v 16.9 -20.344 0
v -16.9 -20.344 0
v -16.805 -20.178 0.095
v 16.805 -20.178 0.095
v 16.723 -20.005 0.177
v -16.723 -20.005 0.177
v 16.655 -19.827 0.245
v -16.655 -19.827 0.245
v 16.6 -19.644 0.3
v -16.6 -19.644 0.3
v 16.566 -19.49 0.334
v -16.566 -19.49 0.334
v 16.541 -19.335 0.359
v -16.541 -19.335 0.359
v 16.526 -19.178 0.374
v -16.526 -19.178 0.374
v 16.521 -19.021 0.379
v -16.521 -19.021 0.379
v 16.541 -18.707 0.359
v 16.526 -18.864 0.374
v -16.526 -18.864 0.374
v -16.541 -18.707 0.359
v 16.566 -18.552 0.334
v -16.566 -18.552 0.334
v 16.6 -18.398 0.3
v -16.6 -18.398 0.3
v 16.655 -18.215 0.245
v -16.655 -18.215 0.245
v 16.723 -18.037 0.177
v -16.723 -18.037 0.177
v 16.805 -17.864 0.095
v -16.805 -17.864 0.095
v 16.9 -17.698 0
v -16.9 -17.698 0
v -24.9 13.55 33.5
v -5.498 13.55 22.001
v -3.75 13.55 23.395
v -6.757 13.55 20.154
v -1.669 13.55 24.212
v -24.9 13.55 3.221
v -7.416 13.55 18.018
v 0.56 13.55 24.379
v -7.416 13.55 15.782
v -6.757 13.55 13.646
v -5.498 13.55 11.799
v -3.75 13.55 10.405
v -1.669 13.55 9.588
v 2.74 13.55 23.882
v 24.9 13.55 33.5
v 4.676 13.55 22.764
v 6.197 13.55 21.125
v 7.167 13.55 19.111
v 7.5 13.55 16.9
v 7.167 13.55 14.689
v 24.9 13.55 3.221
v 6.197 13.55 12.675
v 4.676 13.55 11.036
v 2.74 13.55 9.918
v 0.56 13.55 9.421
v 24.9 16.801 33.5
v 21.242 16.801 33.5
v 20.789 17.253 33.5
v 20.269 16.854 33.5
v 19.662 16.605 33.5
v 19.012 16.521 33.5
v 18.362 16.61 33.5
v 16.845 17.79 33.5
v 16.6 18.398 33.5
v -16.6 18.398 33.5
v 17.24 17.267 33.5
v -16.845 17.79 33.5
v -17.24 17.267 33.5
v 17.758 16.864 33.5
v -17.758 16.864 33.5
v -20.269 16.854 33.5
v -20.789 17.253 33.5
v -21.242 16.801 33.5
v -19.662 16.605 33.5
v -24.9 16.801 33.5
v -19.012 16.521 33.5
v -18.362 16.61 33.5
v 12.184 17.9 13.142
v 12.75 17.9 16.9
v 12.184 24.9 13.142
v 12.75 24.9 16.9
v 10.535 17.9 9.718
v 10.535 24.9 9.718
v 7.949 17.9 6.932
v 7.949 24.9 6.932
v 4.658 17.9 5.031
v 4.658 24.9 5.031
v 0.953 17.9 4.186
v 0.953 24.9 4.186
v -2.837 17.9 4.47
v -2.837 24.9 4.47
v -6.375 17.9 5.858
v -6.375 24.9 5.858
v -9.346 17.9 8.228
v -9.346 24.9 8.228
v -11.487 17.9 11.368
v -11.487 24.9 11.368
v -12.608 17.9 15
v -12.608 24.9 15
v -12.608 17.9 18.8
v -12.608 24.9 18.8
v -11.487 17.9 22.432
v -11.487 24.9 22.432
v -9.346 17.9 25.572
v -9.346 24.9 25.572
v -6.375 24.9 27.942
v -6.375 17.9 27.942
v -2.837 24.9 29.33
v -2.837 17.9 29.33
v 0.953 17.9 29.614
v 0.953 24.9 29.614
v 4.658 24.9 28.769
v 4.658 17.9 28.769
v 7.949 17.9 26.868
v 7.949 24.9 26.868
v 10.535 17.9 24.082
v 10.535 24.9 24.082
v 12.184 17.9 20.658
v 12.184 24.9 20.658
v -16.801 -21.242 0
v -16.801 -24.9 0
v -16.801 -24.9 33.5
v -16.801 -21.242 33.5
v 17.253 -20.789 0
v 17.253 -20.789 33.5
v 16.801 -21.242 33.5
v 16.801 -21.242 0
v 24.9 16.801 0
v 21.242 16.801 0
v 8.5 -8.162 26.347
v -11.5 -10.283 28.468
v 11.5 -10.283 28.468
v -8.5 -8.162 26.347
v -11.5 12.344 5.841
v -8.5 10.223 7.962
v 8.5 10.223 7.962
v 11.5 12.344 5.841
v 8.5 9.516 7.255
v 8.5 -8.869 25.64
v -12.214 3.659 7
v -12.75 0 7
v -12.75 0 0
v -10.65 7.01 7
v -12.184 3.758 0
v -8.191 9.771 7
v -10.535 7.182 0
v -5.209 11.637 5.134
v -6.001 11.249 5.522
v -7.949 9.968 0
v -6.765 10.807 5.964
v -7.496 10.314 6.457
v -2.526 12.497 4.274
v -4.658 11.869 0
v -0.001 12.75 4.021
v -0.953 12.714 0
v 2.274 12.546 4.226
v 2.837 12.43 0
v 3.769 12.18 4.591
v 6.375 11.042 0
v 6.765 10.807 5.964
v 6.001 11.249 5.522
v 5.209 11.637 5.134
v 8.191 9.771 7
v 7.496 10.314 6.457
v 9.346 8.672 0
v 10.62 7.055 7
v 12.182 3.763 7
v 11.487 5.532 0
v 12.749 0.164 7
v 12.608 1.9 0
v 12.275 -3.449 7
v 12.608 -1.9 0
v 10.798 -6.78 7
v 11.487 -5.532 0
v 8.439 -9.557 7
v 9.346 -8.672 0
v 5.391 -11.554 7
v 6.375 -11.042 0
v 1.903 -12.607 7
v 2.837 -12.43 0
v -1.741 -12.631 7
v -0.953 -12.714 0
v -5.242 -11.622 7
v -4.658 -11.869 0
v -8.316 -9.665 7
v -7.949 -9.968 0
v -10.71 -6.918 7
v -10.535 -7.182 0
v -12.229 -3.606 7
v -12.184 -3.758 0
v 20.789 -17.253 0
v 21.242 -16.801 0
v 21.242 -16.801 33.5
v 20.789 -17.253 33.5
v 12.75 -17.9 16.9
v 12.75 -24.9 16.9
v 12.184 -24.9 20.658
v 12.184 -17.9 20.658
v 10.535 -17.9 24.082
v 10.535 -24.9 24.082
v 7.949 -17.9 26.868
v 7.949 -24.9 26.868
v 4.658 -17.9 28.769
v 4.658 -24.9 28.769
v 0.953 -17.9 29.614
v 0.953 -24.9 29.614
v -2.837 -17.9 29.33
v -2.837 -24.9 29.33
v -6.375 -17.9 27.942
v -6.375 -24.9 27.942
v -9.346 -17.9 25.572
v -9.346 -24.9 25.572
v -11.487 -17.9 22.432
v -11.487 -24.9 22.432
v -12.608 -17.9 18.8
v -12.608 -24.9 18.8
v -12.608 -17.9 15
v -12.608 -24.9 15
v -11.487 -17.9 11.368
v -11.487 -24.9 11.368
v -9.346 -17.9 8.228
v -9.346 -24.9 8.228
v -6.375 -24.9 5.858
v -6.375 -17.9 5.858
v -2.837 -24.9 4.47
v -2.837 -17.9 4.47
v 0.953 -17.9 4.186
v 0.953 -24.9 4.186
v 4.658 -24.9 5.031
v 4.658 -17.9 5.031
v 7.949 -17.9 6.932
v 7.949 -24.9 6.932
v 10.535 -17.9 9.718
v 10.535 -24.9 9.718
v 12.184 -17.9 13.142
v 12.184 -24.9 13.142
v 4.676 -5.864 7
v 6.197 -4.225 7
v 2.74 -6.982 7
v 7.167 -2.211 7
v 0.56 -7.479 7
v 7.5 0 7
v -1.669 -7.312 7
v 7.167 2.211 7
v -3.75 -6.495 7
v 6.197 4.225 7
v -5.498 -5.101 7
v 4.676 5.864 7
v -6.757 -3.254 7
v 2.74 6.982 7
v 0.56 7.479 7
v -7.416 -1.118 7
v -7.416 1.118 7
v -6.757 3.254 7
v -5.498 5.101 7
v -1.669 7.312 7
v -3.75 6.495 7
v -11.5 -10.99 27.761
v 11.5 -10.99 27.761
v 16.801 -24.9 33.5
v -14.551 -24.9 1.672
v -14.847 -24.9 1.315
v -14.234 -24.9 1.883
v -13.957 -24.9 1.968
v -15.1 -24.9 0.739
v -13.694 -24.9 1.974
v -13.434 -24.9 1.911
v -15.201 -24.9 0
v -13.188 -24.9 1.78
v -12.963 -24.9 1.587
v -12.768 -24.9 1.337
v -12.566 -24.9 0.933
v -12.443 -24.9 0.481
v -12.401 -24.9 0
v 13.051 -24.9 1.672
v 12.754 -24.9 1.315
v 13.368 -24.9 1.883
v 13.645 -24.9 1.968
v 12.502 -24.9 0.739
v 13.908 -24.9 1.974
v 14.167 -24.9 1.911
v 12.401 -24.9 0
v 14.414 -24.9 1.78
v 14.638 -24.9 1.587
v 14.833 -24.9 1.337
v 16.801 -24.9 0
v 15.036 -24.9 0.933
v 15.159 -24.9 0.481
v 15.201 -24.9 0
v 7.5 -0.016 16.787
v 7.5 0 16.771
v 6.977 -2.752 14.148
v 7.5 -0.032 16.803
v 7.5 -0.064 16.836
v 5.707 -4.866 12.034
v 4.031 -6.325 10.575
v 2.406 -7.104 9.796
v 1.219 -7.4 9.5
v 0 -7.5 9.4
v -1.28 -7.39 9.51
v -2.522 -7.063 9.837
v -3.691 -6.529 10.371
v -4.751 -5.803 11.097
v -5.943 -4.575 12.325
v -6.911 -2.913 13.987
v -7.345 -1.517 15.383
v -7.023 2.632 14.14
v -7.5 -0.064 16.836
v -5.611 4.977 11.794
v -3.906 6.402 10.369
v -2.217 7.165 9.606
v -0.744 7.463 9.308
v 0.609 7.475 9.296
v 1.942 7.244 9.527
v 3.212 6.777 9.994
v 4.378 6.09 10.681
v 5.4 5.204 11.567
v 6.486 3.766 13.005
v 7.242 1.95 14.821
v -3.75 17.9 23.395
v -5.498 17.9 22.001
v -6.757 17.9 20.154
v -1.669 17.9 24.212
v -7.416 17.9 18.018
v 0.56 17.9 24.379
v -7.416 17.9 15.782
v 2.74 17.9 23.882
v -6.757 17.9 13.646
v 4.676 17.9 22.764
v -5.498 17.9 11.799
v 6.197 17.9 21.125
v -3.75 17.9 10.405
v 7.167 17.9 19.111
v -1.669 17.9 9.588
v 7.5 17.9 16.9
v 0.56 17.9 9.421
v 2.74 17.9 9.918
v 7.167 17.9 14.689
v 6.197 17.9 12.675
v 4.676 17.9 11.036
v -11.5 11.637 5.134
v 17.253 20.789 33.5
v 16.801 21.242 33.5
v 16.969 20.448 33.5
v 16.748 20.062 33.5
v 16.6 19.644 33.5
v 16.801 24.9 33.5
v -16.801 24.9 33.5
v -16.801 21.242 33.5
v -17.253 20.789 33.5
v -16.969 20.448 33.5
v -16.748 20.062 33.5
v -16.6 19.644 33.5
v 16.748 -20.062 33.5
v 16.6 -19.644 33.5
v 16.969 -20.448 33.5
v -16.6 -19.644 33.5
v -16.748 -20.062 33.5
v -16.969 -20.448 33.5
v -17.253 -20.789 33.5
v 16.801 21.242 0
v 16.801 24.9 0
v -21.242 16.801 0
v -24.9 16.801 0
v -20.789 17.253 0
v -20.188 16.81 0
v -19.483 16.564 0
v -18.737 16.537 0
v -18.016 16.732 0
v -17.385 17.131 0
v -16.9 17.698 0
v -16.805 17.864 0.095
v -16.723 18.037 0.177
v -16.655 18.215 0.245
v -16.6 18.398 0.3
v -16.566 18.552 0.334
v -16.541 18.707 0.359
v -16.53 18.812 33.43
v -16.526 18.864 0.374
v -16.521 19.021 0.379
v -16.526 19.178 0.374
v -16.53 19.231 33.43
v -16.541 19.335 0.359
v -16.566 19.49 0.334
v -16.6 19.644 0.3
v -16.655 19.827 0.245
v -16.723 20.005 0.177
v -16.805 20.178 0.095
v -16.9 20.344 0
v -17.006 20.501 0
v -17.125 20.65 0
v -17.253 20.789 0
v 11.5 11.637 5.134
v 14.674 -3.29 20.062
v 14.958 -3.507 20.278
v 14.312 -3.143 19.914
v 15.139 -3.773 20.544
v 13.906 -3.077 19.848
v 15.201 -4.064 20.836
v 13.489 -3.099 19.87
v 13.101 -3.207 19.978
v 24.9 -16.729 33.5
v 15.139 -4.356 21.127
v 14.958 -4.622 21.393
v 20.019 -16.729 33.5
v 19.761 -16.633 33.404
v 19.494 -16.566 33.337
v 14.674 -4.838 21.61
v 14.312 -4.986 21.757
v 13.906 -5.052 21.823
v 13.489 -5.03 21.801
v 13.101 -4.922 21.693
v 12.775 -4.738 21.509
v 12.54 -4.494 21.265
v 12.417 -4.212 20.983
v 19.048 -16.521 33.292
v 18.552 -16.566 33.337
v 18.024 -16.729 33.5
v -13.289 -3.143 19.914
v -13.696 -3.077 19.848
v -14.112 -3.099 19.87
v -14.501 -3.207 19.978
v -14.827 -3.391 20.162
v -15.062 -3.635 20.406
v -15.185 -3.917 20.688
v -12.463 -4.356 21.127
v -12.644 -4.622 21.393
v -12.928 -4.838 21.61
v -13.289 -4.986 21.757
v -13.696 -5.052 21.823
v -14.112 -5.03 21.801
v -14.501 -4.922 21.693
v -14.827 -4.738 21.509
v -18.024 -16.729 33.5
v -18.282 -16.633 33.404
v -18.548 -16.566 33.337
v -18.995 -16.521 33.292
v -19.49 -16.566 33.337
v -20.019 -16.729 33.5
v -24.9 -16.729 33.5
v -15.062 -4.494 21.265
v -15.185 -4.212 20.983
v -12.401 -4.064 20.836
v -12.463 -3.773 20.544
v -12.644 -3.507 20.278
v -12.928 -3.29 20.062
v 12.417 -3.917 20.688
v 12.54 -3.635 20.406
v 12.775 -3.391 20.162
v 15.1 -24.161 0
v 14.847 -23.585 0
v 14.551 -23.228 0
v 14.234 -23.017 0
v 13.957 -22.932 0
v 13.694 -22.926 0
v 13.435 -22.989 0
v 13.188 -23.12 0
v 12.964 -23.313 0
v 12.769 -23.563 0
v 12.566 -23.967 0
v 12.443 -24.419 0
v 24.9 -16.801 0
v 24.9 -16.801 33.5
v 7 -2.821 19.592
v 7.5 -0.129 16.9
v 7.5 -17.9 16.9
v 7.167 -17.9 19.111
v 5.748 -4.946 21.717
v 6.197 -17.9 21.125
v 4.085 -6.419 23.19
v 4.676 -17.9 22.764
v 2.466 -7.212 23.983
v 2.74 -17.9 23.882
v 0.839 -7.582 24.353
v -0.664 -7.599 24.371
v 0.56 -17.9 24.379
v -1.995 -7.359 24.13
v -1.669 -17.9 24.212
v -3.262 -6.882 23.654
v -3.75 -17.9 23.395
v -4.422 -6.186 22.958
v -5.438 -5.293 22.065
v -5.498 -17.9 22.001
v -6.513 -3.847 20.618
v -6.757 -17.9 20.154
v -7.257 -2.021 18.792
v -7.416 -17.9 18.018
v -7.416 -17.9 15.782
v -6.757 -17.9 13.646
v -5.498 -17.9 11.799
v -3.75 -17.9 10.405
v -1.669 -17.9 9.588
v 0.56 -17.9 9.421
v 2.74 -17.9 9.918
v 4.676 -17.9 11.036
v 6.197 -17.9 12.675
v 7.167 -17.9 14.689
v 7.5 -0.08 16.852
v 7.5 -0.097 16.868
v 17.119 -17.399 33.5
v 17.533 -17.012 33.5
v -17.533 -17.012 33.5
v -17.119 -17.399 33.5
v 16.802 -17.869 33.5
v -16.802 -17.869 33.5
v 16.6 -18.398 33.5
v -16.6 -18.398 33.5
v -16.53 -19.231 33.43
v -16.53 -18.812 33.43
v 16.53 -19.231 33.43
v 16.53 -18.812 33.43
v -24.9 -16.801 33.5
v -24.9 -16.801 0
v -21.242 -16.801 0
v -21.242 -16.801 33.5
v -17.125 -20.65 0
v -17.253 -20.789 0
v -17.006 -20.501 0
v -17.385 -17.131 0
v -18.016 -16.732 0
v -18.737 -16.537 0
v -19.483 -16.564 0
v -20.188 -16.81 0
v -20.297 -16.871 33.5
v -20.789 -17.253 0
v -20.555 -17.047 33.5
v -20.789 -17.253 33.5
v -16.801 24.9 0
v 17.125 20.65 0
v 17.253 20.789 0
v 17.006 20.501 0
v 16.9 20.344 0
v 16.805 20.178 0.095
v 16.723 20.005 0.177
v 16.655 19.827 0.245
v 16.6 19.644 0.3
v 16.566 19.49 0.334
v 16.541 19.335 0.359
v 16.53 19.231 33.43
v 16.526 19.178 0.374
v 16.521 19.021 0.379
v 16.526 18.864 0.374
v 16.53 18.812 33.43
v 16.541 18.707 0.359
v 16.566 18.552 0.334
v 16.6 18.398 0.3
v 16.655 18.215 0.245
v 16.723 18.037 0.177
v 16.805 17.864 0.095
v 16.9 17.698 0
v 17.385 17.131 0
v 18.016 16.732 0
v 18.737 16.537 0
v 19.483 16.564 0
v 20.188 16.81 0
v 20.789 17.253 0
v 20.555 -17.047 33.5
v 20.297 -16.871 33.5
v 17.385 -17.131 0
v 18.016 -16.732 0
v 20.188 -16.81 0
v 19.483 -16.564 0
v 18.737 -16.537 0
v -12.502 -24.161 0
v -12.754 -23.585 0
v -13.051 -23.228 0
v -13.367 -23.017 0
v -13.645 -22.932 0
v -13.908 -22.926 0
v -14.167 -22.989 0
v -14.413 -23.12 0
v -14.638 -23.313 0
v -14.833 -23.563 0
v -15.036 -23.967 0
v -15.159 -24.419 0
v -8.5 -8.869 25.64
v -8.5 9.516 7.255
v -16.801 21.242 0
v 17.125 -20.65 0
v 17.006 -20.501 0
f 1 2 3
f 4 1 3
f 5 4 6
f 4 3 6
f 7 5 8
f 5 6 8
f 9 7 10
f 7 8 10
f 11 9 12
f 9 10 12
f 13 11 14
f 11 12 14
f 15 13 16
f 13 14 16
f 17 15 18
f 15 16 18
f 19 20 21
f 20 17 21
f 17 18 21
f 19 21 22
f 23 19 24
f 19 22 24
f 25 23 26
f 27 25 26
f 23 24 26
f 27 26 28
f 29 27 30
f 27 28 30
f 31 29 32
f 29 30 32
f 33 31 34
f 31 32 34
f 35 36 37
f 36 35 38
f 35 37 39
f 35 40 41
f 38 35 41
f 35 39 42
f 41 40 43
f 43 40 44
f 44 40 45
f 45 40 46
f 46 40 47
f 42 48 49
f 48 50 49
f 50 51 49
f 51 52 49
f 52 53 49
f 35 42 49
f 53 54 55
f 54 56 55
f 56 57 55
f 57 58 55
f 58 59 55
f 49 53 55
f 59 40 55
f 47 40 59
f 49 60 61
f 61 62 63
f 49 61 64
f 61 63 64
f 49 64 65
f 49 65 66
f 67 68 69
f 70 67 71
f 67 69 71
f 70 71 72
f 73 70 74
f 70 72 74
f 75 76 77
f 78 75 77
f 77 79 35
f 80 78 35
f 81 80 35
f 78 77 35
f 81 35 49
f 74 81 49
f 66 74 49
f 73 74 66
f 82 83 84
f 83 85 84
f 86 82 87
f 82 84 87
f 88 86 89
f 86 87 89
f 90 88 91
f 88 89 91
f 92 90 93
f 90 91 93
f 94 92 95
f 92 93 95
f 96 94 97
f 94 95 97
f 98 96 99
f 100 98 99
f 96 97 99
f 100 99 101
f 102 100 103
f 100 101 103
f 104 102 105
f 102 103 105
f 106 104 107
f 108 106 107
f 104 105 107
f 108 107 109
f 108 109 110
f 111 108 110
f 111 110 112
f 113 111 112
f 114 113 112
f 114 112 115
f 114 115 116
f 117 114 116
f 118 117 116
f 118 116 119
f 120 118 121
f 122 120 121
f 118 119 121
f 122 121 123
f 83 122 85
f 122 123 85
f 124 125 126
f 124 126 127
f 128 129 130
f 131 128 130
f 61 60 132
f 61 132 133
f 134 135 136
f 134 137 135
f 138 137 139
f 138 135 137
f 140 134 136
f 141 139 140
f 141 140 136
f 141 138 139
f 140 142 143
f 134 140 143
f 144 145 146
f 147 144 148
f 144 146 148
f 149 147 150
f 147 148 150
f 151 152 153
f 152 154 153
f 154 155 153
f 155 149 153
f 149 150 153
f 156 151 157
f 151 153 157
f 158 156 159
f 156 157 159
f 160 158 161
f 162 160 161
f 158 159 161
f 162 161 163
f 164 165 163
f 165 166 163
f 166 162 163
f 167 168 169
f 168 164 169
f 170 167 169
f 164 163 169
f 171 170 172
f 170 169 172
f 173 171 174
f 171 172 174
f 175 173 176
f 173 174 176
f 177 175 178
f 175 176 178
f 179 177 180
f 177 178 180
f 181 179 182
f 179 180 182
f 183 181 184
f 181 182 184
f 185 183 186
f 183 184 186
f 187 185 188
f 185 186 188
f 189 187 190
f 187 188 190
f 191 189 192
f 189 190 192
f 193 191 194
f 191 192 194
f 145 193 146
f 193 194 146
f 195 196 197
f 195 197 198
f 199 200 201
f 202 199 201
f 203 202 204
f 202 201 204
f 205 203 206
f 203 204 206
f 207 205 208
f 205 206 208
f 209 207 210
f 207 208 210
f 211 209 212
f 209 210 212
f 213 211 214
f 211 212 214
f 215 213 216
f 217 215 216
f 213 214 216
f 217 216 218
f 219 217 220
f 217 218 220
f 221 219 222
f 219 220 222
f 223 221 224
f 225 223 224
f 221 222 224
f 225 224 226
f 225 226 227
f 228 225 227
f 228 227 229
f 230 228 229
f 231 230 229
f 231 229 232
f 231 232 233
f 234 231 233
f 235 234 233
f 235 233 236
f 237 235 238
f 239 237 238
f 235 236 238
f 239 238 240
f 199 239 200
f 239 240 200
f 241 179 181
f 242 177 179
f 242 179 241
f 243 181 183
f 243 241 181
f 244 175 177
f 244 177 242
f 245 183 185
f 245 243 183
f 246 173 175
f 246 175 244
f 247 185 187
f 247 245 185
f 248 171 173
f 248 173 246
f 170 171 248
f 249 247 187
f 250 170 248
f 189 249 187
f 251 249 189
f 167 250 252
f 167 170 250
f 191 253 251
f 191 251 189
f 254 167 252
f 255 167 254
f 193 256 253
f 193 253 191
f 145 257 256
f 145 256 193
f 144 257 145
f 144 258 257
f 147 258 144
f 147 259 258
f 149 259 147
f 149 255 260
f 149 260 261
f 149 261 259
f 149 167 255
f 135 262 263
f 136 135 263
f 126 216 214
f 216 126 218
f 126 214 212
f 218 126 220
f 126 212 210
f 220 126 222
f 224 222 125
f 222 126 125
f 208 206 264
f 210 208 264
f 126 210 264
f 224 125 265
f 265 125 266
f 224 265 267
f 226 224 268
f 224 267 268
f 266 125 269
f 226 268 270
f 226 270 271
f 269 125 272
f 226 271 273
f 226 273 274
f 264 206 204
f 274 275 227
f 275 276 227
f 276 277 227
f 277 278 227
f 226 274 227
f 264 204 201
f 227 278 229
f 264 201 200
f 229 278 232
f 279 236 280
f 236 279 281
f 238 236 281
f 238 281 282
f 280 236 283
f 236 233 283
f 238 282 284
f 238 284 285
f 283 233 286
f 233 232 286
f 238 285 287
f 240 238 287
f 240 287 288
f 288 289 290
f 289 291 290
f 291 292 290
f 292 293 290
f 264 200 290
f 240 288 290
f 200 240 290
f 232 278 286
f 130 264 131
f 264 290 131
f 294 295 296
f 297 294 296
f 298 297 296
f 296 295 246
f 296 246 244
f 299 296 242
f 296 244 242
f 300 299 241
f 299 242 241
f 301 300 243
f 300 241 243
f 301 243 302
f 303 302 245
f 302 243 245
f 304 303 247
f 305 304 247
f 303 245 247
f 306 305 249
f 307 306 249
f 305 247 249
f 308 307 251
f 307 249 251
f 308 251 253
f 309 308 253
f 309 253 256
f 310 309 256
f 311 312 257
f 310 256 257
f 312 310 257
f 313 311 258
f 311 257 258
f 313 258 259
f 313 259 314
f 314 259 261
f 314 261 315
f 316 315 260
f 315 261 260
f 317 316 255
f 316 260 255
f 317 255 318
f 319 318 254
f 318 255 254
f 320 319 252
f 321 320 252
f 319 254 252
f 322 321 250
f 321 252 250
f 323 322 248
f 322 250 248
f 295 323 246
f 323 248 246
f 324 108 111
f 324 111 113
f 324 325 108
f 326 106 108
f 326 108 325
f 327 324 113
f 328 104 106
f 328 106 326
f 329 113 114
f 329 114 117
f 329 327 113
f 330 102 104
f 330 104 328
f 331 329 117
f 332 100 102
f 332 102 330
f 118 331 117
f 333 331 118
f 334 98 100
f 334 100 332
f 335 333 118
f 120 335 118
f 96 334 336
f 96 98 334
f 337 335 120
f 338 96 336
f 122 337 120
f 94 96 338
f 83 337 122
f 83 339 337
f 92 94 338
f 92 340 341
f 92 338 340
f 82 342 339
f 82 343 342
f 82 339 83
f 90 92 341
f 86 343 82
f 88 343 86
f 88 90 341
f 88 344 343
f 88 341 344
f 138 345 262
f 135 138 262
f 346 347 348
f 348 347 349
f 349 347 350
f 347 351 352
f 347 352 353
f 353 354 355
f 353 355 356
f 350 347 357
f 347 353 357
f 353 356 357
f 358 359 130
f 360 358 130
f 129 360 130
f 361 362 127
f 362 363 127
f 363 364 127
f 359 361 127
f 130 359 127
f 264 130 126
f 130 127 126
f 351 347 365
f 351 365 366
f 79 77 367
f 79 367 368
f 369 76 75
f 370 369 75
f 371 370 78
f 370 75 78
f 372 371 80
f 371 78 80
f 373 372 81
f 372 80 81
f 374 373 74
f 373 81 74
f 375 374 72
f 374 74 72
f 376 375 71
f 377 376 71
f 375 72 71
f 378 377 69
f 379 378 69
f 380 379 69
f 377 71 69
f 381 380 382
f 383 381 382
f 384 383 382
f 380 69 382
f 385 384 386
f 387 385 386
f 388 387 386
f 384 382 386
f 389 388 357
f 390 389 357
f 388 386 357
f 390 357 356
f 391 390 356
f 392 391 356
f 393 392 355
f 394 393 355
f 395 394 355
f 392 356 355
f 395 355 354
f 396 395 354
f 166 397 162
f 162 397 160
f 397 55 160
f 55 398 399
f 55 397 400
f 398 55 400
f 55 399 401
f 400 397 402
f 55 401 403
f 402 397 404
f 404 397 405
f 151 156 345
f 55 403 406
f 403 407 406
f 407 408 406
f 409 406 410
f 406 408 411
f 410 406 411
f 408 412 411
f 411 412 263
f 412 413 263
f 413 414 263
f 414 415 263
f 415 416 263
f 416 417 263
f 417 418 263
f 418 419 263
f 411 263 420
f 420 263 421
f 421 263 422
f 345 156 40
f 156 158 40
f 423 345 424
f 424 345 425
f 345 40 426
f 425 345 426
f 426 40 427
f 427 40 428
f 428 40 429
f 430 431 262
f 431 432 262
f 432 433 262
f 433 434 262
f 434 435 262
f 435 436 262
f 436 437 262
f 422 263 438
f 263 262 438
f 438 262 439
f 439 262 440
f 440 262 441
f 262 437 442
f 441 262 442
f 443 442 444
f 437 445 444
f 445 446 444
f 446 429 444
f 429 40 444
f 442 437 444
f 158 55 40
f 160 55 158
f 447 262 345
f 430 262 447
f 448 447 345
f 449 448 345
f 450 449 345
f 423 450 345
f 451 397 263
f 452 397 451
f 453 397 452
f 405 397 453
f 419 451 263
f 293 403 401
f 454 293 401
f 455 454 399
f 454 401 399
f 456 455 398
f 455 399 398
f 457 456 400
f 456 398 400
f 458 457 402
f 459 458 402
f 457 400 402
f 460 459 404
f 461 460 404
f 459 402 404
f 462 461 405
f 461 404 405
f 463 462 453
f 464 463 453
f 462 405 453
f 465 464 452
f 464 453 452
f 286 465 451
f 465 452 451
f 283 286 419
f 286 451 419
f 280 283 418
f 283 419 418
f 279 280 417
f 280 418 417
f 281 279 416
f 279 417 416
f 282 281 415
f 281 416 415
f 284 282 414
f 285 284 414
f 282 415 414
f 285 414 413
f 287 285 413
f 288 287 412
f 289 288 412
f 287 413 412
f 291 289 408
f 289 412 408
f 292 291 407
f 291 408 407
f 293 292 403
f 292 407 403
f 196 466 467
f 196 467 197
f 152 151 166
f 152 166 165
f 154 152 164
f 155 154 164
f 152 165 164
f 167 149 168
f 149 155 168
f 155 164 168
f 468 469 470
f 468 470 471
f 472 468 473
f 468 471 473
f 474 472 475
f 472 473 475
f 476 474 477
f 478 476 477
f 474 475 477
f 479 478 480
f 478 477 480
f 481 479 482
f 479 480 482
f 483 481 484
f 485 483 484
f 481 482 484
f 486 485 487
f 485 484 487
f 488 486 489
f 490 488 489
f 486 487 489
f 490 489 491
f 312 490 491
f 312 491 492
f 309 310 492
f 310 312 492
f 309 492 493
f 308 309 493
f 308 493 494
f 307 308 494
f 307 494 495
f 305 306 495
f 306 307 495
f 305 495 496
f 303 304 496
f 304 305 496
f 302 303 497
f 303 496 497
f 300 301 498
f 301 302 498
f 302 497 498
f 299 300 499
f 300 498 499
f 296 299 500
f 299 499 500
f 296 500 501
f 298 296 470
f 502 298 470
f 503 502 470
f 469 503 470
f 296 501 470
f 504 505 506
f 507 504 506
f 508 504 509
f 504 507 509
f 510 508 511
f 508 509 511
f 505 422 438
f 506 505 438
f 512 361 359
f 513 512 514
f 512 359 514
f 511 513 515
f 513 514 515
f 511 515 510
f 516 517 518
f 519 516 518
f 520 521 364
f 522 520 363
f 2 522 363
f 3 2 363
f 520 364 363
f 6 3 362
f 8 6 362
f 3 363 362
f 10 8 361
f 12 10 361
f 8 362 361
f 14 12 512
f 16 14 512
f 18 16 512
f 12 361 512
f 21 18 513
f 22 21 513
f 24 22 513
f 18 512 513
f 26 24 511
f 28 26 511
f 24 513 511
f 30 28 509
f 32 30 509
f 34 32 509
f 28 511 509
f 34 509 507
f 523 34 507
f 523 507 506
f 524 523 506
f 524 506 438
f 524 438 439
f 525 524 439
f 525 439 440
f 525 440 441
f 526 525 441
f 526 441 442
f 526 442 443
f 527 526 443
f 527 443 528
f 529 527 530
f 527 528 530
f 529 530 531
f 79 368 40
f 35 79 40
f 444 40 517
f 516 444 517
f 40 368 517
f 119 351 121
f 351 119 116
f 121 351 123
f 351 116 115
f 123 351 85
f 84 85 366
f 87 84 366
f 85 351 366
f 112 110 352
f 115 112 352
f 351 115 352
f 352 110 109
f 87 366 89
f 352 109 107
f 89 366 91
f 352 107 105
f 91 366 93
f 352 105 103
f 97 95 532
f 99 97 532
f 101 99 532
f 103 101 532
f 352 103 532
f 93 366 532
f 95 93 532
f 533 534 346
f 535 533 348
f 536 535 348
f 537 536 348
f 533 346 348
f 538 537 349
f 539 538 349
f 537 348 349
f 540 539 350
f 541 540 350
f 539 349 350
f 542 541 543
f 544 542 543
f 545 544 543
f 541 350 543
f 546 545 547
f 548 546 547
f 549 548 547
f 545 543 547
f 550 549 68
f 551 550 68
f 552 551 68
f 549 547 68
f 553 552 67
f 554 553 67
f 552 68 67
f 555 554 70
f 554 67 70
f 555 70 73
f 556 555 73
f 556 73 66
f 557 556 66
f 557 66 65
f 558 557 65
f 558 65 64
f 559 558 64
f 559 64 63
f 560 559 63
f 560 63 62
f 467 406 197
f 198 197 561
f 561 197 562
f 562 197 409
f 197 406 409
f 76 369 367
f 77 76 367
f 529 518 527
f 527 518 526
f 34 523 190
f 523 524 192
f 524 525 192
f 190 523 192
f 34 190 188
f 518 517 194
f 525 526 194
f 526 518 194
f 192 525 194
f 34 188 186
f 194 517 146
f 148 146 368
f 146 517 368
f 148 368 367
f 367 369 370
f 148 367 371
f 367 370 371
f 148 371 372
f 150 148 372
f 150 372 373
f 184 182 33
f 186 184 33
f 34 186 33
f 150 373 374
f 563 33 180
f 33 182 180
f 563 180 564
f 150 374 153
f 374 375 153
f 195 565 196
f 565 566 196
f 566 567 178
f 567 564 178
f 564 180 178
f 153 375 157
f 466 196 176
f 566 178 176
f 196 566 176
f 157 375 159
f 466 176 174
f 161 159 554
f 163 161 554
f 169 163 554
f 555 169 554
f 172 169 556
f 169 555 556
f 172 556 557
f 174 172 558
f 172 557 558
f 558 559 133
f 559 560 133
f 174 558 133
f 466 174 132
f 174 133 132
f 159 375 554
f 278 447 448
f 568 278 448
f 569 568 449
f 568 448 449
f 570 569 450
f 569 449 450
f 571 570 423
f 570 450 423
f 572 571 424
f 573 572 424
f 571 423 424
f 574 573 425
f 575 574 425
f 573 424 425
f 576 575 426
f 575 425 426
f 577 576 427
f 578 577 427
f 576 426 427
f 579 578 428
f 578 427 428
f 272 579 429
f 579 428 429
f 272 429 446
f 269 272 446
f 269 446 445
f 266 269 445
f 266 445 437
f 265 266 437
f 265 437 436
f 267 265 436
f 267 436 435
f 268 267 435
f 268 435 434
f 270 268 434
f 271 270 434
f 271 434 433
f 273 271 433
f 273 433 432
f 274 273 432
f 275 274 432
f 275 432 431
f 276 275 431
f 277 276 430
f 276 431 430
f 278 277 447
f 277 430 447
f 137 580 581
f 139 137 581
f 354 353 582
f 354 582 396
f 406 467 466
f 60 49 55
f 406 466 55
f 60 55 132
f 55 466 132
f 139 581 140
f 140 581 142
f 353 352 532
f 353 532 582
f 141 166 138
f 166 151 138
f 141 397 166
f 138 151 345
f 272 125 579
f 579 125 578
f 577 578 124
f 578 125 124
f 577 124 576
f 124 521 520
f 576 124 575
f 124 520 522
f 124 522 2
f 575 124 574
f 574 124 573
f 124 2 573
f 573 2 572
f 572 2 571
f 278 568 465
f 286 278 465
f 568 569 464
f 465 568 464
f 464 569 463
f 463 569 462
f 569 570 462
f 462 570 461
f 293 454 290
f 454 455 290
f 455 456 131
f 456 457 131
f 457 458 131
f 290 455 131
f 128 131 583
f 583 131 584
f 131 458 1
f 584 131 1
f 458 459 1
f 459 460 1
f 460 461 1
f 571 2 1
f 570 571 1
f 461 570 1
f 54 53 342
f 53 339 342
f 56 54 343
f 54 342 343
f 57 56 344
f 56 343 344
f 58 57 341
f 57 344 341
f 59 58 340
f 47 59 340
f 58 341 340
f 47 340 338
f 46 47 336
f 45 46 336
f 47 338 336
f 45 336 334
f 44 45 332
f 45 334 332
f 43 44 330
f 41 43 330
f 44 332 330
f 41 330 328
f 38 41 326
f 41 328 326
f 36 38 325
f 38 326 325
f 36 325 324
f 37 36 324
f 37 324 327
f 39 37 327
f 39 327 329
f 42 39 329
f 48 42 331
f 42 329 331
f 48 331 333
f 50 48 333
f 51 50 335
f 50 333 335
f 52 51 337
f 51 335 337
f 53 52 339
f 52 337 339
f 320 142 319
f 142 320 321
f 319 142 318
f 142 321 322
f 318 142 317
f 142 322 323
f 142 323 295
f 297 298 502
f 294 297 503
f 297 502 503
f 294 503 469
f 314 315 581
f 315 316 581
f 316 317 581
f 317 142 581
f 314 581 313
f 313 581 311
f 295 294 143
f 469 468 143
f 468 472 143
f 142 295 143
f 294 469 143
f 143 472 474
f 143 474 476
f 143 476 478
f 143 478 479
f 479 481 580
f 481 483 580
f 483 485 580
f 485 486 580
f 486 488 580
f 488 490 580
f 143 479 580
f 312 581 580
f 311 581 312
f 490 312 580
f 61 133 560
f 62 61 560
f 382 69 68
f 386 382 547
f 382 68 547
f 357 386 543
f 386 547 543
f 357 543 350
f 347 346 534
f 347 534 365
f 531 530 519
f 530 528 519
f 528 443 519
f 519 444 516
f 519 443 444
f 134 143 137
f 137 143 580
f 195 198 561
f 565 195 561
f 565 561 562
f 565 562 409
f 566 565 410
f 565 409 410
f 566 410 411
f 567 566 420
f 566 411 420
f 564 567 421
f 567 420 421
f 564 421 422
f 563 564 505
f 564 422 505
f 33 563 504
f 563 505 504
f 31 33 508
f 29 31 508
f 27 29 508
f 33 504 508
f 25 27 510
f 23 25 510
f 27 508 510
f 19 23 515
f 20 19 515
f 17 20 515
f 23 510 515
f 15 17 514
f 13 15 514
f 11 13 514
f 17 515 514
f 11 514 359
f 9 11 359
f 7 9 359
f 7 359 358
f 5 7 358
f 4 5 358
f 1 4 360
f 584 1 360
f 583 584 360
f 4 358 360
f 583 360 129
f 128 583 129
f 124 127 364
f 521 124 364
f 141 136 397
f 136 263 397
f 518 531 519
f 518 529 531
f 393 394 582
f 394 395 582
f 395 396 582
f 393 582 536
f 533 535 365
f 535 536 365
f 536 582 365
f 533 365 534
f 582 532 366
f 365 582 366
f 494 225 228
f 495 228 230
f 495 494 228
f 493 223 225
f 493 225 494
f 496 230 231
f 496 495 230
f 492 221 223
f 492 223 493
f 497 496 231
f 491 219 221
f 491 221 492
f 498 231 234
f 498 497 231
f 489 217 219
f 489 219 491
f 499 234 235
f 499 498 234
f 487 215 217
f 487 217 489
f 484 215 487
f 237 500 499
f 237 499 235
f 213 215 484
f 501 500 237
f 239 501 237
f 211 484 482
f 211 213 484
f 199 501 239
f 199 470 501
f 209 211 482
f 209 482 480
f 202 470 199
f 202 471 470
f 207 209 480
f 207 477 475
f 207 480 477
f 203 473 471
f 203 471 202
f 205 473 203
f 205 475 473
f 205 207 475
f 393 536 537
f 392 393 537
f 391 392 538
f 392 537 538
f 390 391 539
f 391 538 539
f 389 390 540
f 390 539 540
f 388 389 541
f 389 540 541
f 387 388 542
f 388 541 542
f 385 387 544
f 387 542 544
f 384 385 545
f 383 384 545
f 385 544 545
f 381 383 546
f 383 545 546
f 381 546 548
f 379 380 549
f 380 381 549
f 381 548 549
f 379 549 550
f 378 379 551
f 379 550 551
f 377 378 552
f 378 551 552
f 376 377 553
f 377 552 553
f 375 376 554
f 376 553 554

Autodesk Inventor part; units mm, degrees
ref_plane "YZ Plane" through (0, 0, 0) normal (1, 0, 0) x (0, 1, 0)
sketch "Sketch1" plane through (0, 0, 0) normal (0, 0, 1) x (1, 0, 0)
  line L0 (-34.86, 0) -> (34.86, 0) construction
  line L1 (0, -34.86) -> (0, 34.86) construction
  line L2 (0, 0) -> (16.9726, 16.9726) construction
  line L3 (0, 0) -> (24.0028, 0) construction
  line L4 (0, 24.9) -> (16.8009, 24.9)
  line L5 (16.8009, 24.9) -> (16.8009, 21.2415)
  line L6 (16.8009, 21.2415) -> (19.0212, 19.0212)
  line L7 (24.9, 0) -> (24.9, 16.8009)
  line L8 (24.9, 16.8009) -> (21.2415, 16.8009)
  line L9 (21.2415, 16.8009) -> (19.0212, 19.0212)
  line L10 (0, -24.9) -> (16.8009, -24.9)
  line L11 (16.8009, -24.9) -> (16.8009, -21.2415)
  line L12 (16.8009, -21.2415) -> (19.0212, -19.0212)
  line L13 (24.9, 0) -> (24.9, -16.8009)
  line L14 (24.9, -16.8009) -> (21.2415, -16.8009)
  line L15 (21.2415, -16.8009) -> (19.0212, -19.0212)
  line L16 (0, 0) -> (-16.9726, 16.9726) construction
  line L17 (0, 0) -> (-24.0028, 0) construction
  line L18 (0, 24.9) -> (-16.8009, 24.9)
  line L19 (-16.8009, 24.9) -> (-16.8009, 21.2415)
  line L20 (-16.8009, 21.2415) -> (-19.0212, 19.0212)
  line L21 (-24.9, 0) -> (-24.9, 16.8009)
  line L22 (-24.9, 16.8009) -> (-21.2415, 16.8009)
  line L23 (-21.2415, 16.8009) -> (-19.0212, 19.0212)
  line L24 (0, -24.9) -> (-16.8009, -24.9)
  line L25 (-16.8009, -24.9) -> (-16.8009, -21.2415)
  line L26 (-16.8009, -21.2415) -> (-19.0212, -19.0212)
  line L27 (-21.2415, -16.8009) -> (-19.0212, -19.0212)
  line L28 (-24.9, -16.8009) -> (-21.2415, -16.8009)
  line L29 (-24.9, 0) -> (-24.9, -16.8009)
  circle A0 centre (0, 0) radius 7.5
  dimension "d17" = 45
  dimension "d18" = 24.9
  dimension "d20" = 3.14
  dimension "d21" = 26.9
  dimension "d22" = 15
extrude "Extrusion1" add sketch "Sketch1" along normal blind 3
sketch "Sketch6" plane through (0, 0, 3) normal (0, 0, 1) x (1, 0, 0)
  circle A0 centre (0, 0) radius 7.5 projected
  line L0 (16.8009, 24.9) -> (-16.8009, 24.9) projected
  line L1 (-16.8009, 24.9) -> (-16.8009, 21.2415) projected
  line L2 (-16.8009, 21.2415) -> (-21.2415, 16.8009) projected
  line L3 (-21.2415, 16.8009) -> (-24.9, 16.8009) projected
  line L4 (-24.9, 16.8009) -> (-24.9, -16.8009) projected
  line L5 (-24.9, -16.8009) -> (-21.2415, -16.8009) projected
  line L6 (-21.2415, -16.8009) -> (-16.8009, -21.2415) projected
  line L7 (-16.8009, -21.2415) -> (-16.8009, -24.9) projected
  line L8 (-16.8009, -24.9) -> (16.8009, -24.9) projected
  line L9 (16.8009, -24.9) -> (16.8009, -21.2415) projected
  line L10 (16.8009, -21.2415) -> (21.2415, -16.8009) projected
  line L11 (21.2415, -16.8009) -> (24.9, -16.8009) projected
  line L12 (24.9, -16.8009) -> (24.9, 16.8009) projected
  line L13 (24.9, 16.8009) -> (21.2415, 16.8009) projected
  line L14 (21.2415, 16.8009) -> (16.8009, 21.2415) projected
  line L15 (16.8009, 21.2415) -> (16.8009, 24.9) projected
  line L16 (24.9, -16.8009) -> (24.9, 16.8009) projected
  line L17 (24.9, 13.5502) -> (-24.9, 13.5502)
  line L18 (-24.9, 16.8009) -> (-24.9, -16.8009) projected
ref_plane "Work Plane2" through (-27.39, -0.0644, 16.8356) normal (0, -0.7071, -0.7071) x (0, 0.7071, -0.7071)
extrude "Extrusion6" add sketch "Sketch6" along normal up to surface contours L12 L11 L10 L9 L8 L7 L6 L5 L4 L17 surface through (-27.39, -0.0644, 16.8356) normal (0, -0.7071, -0.7071)
sketch "Sketch7" plane through (-16.8009, -24.9, 0) normal (0, -1, 0) x (1, 0, 0)
  line L0 (-0.0991, 33.8) -> (0.8009, 33.8) projected
  arc A0 (-6.0991, 41.8) -> (-8.0991, 39.8) centre (-6.0991, 39.8) ccw projected
  arc A1 (41.7009, 39.8) -> (39.7009, 41.8) centre (39.7009, 39.8) ccw projected
  line L1 (41.9057, 41.8) -> (-10.6447, 41.8)
  line L2 (-10.6447, 41.8) -> (-10.6447, 33.8)
  line L3 (-10.6447, 33.8) -> (41.9057, 33.8)
  line L4 (41.9057, 33.8) -> (41.9057, 41.8)
  point P0 (16.8009, 0)
extrude "Extrusion7" cut sketch "Sketch7" against normal through all
sketch "Sketch8" plane through (21.2415, -16.8009, 0) normal (0, -1, 0) x (1, 0, 0)
  line L0 (-8.7415, 0) -> (-33.7415, 0) projected
  line L1 (-33.7415, -1) -> (-8.7415, -1) projected
  line L2 (-46.1415, 33.572) -> (-42.483, 33.572) projected
  line L3 (3.6585, 33.8) -> (0.0423, 33.8) projected
  line L4 (0, 33.572) -> (3.6585, 33.572) projected
  line L5 (-46.1415, 3.2209) -> (-46.1415, 33.572) projected
  line L6 (3.6585, 33.572) -> (-46.1415, 33.572)
  line L7 (-46.1415, 33.572) -> (-46.1415, 30.572)
  line L8 (-46.1415, 30.572) -> (3.6585, 30.572)
  line L9 (3.6585, 30.572) -> (3.6585, 33.572)
  dimension "d45" = 3
sketch "Sketch9" plane through (-16.8009, -24.9, 0) normal (0, -1, 0) x (1, 0, 0)
  line L0 (33.7009, 0) -> (33.0009, 0) construction
  line L1 (36.0327, -6) -> (22.7009, -6) construction
  circle A0 centre (16.8009, 16.9) radius 16.9 construction
  circle A1 centre (16.8009, 16.9) radius 7.5
  line L2 (39.7009, 8.1978) -> (33.7009, 8.1978) projected
  line L3 (33.7009, 8.1978) -> (33.7009, 0) projected
  line L4 (33.0009, 0) -> (33.0009, -3.7) projected
  line L5 (33.0009, -3.7) -> (22.7009, -3.7) projected
  line L6 (22.7009, -3.7) -> (22.7009, -6) projected
  arc A2 (39.7009, -2.3319) -> (36.0327, -6) centre (36.8009, -3.1) ccw projected
  line L7 (39.7009, 8.1978) -> (39.7009, -2.3319) projected
  point P0 (16.8009, 0)
  dimension "d46" = 15
extrude "Extrusion8" cut sketch "Sketch9" against normal through all
sketch "Sketch10" plane through (-16.8009, -24.9, 0) normal (0, -1, 0) x (1, 0, 0)
  circle A0 centre (16.8009, 16.9) radius 7.5 projected
  circle A1 centre (16.8009, 16.9) radius 12.75
  point P0 (16.8009, 0)
  dimension "d49" = 25.5
extrude "Extrusion9" cut sketch "Sketch10" against normal blind 7
sketch "Sketch11" plane through (0, 0, 0) normal (0, 0, -1) x (-1, 0, 0)
  circle A0 centre (0, 0) radius 7.5 projected
  circle A1 centre (0, 0) radius 12.75
  dimension "d52" = 25.5
extrude "Extrusion10" cut sketch "Sketch11" against normal blind 7
sketch "Sketch12" plane through (-24.9, 13.5502, 3.2209) normal (0, 0.7071, 0.7071) x (1, 0, 0)
  line L0 (32.9, -31.2053) -> (32.9, -6.2053) construction
  line L1 (32.9, -6.2053) -> (16.9, -6.2053) construction
  line L2 (16.9, -6.2053) -> (16.9, -31.2053) construction
  line L3 (16.9, -31.2053) -> (32.9, -31.2053) construction
  line L4 (32.9, -31.2053) -> (16.9, -31.2053) construction
  line L5 (16.9, -31.2053) -> (16.9, -6.2053) construction
  line L6 (16.9, -6.2053) -> (32.9, -6.2053) construction
  line L7 (32.9, -6.2053) -> (32.9, -31.2053) construction
  line L8 (16.4, -5.7053) -> (33.4, -5.7053)
  line L9 (33.4, -5.7053) -> (33.4, -31.7053)
  line L10 (33.4, -31.7053) -> (16.4, -31.7053)
  line L11 (16.4, -31.7053) -> (16.4, -5.7053)
  line L12 (36.4, -2.7053) -> (13.4, -2.7053)
  line L13 (13.4, -2.7053) -> (13.4, -34.7053)
  line L14 (13.4, -34.7053) -> (36.4, -34.7053)
  line L15 (36.4, -34.7053) -> (36.4, -2.7053)
  point P0 (24.9, -7.3039)
  dimension "d55" = 0.5
  dimension "d56" = 3
extrude "Extrusion11" add sketch "Sketch12" along normal blind 1
sketch "Sketch13" plane through (0, 0, 3) normal (0, 0, 1) x (1, 0, 0)
  line L0 (-24.9, 13.5502) -> (24.9, 13.5502) projected
  line L1 (24.9, 13.5502) -> (24.9, 16.8009) projected
  line L2 (24.9, 16.8009) -> (21.2415, 16.8009) projected
  line L3 (21.2415, 16.8009) -> (16.8009, 21.2415) projected
  line L4 (16.8009, 21.2415) -> (16.8009, 24.9) projected
  line L5 (16.8009, 24.9) -> (-16.8009, 24.9) projected
  line L6 (-16.8009, 24.9) -> (-16.8009, 21.2415) projected
  line L7 (-16.8009, 21.2415) -> (-21.2415, 16.8009) projected
  line L8 (-21.2415, 16.8009) -> (-24.9, 16.8009) projected
  line L9 (-24.9, 16.8009) -> (-24.9, 13.5502) projected
  point P0 (0, 0)
ref_plane "Work Plane3" through (-16.9, 21.1423, 33.8) normal (0, 0, -1) x (0, 1, 0)
extrude "Extrusion12" add sketch "Sketch13" along normal up to surface (30.8 mm away)
sketch "Sketch14" plane through (-16.8009, 24.9, 0) normal (0, 1, 0) x (1, 0, 0)
  line L0 (-0.0991, -33.8) -> (-0.0991, 0) construction
  line L1 (33.6017, -33.8) -> (0, -33.8) projected
  line L2 (0, 0) -> (33.6017, 0) projected
  line L3 (33.6017, 0) -> (33.6017, -33.8) projected
  arc A0 (9.3011, -16.8356) -> (24.3006, -16.8356) centre (16.8009, -16.9) ccw construction
  circle A1 centre (16.8009, -16.9) radius 12.75
  point P0 (16.8009, 0)
  dimension "d61" = 25.5
extrude "Extrusion13" cut sketch "Sketch14" against normal blind 7
sketch "Sketch15" plane through (0, 17.9, 16.9) normal (0, 1, 0) x (1, 0, 0)
  circle A0 centre (0, 0) radius 7.5 projected
  point P0 (0, 16.9)
extrude "Extrusion14" cut sketch "Sketch15" against normal through all
sketch "Sketch16" plane through (21.2415, -16.8009, 33.572) normal (0, 0.7071, 0.7071) x (1, 0, 0)
  line L0 (-42.255, -0.3224) -> (-0.228, -0.3224) projected
  line L1 (-0.228, -0.3224) -> (0, 0) projected
  line L2 (0, 0) -> (3.6585, 0) projected
  line L3 (3.6585, 0) -> (3.6585, 42.9229) projected
  line L4 (3.6585, 42.9229) -> (-46.1415, 42.9229) projected
  line L5 (-46.1415, 42.9229) -> (-46.1415, 0) projected
  line L6 (-46.1415, 0) -> (-42.483, 0) projected
  line L7 (-42.483, 0) -> (-42.255, -0.3224) projected
  ellipse E0 centre (-21.2415, 23.76) end of major axis (-21.2415, 41.7912) minor radius 12.75 (-16.0323, 40.2176) -> (-26.4507, 40.2176) ccw projected
  line L8 (-9.7415, 40.2176) -> (-9.7415, 8.2176) projected
  line L9 (-9.7415, 8.2176) -> (-32.7415, 8.2176) projected
  line L10 (-32.7415, 8.2176) -> (-32.7415, 40.2176) projected
  line L11 (-16.0323, 40.2176) -> (-9.7415, 40.2176) projected
  line L12 (-4.4406, 18.0121) -> (-38.0423, 18.0121) projected
  circle A0 centre (-35.0423, 18.0121) radius 1.4
  circle A1 centre (-7.4406, 18.0121) radius 1.4
  line L13 (-32.7415, 40.2176) -> (-26.4507, 40.2176) projected
  point P0 (-21.2415, 35.619)
  point P1 (-4.4406, 18.0121)
  dimension "d66" = 3
  dimension "d67" = 3
  dimension "d68" = 2.8
  dimension "d69" = 2.8
extrude "Extrusion15" cut sketch "Sketch16" along normal through all both and the other way through all contours A1 L12 | L12 A1 | A0 L12 | L12 A0
sketch "Sketch17" plane through (-24.9, -16.8009, 0) normal (-1, 0, 0) x (0, 0, 1)
  line L0 (43.2726, 50.002) -> (33.5, 50.002)
  line L1 (33.5, 50.002) -> (33.5, -21.818)
  line L2 (33.5, -21.818) -> (43.2726, -21.818)
  line L3 (43.2726, -21.818) -> (43.2726, 50.002)
  line L4 (0, 0) -> (0, 33.6017) projected
  point P0 (0, 16.8009)
  dimension "d72" = 33.5
extrude "Extrusion16" cut sketch "Sketch17" against normal through all
sketch "Sketch18" plane through (-24.9, 13.5502, 33.5) normal (0, 0, 1) x (1, 0, 0)
  line L0 (49.8, 0) -> (0, 0) projected
  line L1 (49.8, 3.2506) -> (49.8, 0) projected
  line L2 (46.1415, 3.2506) -> (49.8, 3.2506) projected
  line L3 (41.7009, 7.6912) -> (46.1415, 3.2506) projected
  line L4 (41.7009, 11.3498) -> (41.7009, 7.6912) projected
  line L5 (8.0991, 11.3498) -> (41.7009, 11.3498) projected
  line L6 (8.0991, 7.6912) -> (8.0991, 11.3498) projected
  line L7 (3.6585, 3.2506) -> (8.0991, 7.6912) projected
  line L8 (0, 3.2506) -> (3.6585, 3.2506) projected
  line L9 (0, 0) -> (0, 3.2506) projected
  line L10 (3.6585, -30.3511) -> (0, -30.3511) projected
  line L11 (8.0991, -34.7917) -> (3.6585, -30.3511) projected
  line L12 (8.0991, -38.4502) -> (8.0991, -34.7917) projected
  line L13 (41.7009, -38.4502) -> (8.0991, -38.4502) projected
  line L14 (41.7009, -34.7917) -> (41.7009, -38.4502) projected
  line L15 (46.1415, -30.3511) -> (41.7009, -34.7917) projected
  line L16 (49.8, -30.3511) -> (46.1415, -30.3511) projected
  line L17 (49.8, -30.2791) -> (49.8, -30.3511) projected
  line L18 (0, -30.2791) -> (49.8, -30.2791) projected
  line L19 (0, -30.3511) -> (0, -30.2791) projected
  line L20 (41.7009, 7.6912) -> (46.1415, 3.2506) construction
  line L21 (43.9212, 5.4709) -> (5.8788, -32.5714) construction
  line L22 (8.0991, -34.7917) -> (3.6585, -30.3511) construction
  circle A0 centre (43.9212, 5.4709) radius 2.5
  point P0 (24.9, -13.5502)
  dimension "d75" = 5
extrude "Extrusion17" cut sketch "Sketch18" against normal through all contours A0 L3 | L3 A0
mirror "Mirror3" about plane through (0, 0, 0) normal (1, 0, 0) of "Extrusion17"
mirror "Mirror4" about plane through (0, 0, 0) normal (0, 1, 0) of "Extrusion17", "Mirror3"
pattern_circular "Circular Pattern1" count 4 over 360 about axis through (0, -24.9, 16.9) along (0, 1, 0) of "Extrusion17", "Mirror3", "Mirror4"
properties part number "20_Cube_Insert_Beamsplitter"
